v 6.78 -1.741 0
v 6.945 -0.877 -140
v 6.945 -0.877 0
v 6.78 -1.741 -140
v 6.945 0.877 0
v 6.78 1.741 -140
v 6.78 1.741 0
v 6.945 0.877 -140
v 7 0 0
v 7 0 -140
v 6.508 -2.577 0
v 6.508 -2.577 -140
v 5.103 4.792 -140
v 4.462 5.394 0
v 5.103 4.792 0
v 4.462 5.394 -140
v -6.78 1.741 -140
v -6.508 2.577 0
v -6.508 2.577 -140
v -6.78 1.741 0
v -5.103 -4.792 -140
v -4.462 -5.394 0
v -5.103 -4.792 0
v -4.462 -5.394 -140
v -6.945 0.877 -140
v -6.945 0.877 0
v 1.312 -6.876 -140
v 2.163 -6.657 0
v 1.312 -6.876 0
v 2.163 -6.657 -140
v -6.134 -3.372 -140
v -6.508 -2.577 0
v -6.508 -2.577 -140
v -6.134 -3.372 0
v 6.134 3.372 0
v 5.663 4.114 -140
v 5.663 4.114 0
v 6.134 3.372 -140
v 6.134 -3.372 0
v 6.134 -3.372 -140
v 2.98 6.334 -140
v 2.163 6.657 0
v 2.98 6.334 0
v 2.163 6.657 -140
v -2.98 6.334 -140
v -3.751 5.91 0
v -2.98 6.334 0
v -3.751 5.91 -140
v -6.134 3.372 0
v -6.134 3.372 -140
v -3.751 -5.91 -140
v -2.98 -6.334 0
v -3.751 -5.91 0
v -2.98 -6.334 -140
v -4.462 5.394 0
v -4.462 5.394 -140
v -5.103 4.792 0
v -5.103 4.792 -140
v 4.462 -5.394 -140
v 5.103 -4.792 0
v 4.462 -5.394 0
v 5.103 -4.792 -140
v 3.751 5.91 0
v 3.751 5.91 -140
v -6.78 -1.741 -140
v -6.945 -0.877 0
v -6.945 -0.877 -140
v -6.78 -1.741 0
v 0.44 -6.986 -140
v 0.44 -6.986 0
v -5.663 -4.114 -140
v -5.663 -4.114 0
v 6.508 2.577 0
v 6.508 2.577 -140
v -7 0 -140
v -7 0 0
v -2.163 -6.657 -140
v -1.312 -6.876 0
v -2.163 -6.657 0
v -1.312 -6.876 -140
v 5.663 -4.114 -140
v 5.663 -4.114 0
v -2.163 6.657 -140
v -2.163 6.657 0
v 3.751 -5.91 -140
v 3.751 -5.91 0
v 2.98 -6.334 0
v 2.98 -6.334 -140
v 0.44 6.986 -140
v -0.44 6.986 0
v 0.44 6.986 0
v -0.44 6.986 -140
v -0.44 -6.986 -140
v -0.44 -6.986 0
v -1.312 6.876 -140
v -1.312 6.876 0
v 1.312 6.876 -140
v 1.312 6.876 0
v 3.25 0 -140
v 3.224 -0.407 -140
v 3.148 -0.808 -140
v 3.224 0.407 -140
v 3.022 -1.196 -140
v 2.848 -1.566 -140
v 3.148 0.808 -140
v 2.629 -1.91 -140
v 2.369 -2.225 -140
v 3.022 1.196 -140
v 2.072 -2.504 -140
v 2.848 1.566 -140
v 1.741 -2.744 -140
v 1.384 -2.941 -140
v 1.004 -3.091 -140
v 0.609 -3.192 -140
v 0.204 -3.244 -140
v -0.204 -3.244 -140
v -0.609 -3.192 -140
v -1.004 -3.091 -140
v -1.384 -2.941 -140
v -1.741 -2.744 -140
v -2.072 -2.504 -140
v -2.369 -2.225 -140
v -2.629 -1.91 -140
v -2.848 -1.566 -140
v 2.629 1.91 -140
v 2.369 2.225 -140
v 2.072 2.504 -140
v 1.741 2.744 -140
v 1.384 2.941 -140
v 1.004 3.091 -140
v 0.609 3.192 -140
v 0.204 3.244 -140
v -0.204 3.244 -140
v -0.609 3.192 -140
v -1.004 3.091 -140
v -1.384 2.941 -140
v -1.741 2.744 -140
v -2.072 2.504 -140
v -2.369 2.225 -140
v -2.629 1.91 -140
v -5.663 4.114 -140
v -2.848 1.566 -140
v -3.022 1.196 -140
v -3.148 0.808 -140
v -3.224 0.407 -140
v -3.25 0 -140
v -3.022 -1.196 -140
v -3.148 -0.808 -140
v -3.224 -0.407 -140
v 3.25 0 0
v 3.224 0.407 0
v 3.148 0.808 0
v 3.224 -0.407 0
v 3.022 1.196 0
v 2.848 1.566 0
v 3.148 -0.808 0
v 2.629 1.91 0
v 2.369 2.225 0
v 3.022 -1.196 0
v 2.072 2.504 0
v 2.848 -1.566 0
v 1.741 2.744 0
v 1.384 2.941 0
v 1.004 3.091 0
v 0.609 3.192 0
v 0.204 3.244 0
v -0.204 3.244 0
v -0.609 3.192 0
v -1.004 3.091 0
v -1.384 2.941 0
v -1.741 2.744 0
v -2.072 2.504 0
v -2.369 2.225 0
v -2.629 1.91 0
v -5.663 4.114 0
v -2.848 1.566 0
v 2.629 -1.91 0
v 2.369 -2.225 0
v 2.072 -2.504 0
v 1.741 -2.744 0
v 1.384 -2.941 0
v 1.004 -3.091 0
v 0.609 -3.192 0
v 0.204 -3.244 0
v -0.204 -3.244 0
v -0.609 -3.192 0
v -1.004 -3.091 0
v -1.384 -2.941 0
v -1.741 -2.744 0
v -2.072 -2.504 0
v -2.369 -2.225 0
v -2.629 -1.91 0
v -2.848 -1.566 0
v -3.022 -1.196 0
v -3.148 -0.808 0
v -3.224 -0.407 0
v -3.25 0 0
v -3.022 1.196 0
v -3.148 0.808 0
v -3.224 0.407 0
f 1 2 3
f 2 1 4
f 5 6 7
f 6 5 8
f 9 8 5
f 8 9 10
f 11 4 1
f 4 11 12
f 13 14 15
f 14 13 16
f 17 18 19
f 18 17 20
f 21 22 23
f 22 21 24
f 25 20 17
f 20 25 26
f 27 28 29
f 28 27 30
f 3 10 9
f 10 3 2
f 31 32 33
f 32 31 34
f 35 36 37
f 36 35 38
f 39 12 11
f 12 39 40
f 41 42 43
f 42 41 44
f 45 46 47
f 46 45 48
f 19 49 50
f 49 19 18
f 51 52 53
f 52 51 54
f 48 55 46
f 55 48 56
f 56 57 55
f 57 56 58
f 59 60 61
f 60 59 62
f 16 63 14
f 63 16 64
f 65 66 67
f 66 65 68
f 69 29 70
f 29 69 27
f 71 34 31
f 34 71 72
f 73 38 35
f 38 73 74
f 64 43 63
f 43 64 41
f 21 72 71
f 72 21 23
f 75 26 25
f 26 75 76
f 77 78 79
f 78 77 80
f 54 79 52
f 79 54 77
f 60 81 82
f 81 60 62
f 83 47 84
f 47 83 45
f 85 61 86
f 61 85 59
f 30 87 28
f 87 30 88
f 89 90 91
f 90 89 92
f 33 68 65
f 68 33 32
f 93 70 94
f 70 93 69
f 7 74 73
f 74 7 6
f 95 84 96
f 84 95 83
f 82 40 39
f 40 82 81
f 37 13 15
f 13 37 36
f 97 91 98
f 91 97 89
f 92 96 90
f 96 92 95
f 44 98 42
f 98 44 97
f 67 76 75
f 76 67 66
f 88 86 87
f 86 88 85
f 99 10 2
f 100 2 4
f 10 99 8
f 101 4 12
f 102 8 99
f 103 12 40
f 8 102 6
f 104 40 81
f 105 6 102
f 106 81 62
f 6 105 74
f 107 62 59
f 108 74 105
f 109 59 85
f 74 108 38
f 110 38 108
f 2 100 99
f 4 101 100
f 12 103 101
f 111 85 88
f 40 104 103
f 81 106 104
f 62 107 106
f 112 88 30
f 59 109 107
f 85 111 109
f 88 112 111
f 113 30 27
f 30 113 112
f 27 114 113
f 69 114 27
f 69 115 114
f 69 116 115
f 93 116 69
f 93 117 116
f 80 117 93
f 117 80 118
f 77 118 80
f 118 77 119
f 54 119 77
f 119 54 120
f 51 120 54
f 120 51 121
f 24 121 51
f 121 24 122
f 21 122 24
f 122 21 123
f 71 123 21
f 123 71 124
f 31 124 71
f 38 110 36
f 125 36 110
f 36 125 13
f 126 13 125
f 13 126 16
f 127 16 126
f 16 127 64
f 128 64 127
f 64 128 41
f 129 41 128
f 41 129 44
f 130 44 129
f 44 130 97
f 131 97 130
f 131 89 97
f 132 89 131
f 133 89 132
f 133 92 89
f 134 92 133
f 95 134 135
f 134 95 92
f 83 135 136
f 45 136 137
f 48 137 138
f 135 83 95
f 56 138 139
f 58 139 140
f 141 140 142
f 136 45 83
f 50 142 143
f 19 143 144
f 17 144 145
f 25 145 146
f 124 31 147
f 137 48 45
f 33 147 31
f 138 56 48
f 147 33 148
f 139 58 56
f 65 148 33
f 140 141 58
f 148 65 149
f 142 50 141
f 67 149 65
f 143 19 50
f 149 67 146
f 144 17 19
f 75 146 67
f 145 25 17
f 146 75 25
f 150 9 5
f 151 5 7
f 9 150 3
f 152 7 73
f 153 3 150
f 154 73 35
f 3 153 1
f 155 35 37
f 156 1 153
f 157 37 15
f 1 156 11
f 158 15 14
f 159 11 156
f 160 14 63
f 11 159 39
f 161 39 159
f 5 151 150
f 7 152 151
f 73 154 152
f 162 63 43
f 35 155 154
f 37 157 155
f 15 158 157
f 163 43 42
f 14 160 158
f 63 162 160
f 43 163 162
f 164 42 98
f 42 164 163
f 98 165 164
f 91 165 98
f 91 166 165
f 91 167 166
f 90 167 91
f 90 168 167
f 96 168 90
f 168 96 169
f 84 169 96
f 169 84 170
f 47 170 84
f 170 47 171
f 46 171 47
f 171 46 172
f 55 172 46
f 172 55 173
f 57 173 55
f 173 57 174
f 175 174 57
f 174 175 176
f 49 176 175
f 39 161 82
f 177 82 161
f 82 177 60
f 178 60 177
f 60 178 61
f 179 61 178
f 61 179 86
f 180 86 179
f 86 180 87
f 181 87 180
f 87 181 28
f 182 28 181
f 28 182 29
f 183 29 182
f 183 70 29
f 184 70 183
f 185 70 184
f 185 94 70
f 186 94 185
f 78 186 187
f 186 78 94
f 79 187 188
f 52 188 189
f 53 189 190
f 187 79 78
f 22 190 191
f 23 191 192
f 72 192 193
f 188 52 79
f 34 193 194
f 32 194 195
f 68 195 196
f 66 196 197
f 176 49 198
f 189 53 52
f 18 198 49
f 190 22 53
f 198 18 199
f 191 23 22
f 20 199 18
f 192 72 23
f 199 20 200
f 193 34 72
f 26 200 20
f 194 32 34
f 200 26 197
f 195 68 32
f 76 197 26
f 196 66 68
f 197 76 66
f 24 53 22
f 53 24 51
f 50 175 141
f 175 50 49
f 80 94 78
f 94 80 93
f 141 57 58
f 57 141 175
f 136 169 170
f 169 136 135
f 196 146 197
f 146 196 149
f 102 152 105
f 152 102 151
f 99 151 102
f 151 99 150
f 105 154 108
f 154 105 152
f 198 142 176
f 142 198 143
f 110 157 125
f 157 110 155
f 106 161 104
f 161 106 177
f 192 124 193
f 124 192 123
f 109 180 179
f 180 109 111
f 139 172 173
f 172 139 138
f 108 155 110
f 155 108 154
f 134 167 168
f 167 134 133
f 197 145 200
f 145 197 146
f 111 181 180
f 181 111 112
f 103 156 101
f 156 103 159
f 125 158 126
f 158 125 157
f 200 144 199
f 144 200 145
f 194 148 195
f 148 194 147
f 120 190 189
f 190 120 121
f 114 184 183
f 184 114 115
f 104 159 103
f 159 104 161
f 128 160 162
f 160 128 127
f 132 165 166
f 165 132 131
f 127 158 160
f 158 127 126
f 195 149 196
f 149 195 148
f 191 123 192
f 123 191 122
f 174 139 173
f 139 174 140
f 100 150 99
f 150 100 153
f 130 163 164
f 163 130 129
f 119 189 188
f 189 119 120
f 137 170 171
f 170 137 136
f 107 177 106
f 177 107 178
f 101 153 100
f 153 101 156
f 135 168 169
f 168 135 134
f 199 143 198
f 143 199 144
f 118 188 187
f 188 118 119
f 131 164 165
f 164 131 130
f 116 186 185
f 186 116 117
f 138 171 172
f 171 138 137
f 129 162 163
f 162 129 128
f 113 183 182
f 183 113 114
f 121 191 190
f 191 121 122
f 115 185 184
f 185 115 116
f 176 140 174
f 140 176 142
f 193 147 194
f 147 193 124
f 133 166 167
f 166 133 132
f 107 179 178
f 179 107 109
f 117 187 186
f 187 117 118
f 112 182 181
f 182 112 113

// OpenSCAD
$fn = 50;


difference() {
	union() {
		translate(v = [0, 0, -140.0000000000]) {
			cylinder(h = 140, r = 7.0000000000);
		}
	}
	union() {
		#translate(v = [0, 0, -140]) {
			cylinder(h = 140, r = 3.2500000000);
		}
	}
}
